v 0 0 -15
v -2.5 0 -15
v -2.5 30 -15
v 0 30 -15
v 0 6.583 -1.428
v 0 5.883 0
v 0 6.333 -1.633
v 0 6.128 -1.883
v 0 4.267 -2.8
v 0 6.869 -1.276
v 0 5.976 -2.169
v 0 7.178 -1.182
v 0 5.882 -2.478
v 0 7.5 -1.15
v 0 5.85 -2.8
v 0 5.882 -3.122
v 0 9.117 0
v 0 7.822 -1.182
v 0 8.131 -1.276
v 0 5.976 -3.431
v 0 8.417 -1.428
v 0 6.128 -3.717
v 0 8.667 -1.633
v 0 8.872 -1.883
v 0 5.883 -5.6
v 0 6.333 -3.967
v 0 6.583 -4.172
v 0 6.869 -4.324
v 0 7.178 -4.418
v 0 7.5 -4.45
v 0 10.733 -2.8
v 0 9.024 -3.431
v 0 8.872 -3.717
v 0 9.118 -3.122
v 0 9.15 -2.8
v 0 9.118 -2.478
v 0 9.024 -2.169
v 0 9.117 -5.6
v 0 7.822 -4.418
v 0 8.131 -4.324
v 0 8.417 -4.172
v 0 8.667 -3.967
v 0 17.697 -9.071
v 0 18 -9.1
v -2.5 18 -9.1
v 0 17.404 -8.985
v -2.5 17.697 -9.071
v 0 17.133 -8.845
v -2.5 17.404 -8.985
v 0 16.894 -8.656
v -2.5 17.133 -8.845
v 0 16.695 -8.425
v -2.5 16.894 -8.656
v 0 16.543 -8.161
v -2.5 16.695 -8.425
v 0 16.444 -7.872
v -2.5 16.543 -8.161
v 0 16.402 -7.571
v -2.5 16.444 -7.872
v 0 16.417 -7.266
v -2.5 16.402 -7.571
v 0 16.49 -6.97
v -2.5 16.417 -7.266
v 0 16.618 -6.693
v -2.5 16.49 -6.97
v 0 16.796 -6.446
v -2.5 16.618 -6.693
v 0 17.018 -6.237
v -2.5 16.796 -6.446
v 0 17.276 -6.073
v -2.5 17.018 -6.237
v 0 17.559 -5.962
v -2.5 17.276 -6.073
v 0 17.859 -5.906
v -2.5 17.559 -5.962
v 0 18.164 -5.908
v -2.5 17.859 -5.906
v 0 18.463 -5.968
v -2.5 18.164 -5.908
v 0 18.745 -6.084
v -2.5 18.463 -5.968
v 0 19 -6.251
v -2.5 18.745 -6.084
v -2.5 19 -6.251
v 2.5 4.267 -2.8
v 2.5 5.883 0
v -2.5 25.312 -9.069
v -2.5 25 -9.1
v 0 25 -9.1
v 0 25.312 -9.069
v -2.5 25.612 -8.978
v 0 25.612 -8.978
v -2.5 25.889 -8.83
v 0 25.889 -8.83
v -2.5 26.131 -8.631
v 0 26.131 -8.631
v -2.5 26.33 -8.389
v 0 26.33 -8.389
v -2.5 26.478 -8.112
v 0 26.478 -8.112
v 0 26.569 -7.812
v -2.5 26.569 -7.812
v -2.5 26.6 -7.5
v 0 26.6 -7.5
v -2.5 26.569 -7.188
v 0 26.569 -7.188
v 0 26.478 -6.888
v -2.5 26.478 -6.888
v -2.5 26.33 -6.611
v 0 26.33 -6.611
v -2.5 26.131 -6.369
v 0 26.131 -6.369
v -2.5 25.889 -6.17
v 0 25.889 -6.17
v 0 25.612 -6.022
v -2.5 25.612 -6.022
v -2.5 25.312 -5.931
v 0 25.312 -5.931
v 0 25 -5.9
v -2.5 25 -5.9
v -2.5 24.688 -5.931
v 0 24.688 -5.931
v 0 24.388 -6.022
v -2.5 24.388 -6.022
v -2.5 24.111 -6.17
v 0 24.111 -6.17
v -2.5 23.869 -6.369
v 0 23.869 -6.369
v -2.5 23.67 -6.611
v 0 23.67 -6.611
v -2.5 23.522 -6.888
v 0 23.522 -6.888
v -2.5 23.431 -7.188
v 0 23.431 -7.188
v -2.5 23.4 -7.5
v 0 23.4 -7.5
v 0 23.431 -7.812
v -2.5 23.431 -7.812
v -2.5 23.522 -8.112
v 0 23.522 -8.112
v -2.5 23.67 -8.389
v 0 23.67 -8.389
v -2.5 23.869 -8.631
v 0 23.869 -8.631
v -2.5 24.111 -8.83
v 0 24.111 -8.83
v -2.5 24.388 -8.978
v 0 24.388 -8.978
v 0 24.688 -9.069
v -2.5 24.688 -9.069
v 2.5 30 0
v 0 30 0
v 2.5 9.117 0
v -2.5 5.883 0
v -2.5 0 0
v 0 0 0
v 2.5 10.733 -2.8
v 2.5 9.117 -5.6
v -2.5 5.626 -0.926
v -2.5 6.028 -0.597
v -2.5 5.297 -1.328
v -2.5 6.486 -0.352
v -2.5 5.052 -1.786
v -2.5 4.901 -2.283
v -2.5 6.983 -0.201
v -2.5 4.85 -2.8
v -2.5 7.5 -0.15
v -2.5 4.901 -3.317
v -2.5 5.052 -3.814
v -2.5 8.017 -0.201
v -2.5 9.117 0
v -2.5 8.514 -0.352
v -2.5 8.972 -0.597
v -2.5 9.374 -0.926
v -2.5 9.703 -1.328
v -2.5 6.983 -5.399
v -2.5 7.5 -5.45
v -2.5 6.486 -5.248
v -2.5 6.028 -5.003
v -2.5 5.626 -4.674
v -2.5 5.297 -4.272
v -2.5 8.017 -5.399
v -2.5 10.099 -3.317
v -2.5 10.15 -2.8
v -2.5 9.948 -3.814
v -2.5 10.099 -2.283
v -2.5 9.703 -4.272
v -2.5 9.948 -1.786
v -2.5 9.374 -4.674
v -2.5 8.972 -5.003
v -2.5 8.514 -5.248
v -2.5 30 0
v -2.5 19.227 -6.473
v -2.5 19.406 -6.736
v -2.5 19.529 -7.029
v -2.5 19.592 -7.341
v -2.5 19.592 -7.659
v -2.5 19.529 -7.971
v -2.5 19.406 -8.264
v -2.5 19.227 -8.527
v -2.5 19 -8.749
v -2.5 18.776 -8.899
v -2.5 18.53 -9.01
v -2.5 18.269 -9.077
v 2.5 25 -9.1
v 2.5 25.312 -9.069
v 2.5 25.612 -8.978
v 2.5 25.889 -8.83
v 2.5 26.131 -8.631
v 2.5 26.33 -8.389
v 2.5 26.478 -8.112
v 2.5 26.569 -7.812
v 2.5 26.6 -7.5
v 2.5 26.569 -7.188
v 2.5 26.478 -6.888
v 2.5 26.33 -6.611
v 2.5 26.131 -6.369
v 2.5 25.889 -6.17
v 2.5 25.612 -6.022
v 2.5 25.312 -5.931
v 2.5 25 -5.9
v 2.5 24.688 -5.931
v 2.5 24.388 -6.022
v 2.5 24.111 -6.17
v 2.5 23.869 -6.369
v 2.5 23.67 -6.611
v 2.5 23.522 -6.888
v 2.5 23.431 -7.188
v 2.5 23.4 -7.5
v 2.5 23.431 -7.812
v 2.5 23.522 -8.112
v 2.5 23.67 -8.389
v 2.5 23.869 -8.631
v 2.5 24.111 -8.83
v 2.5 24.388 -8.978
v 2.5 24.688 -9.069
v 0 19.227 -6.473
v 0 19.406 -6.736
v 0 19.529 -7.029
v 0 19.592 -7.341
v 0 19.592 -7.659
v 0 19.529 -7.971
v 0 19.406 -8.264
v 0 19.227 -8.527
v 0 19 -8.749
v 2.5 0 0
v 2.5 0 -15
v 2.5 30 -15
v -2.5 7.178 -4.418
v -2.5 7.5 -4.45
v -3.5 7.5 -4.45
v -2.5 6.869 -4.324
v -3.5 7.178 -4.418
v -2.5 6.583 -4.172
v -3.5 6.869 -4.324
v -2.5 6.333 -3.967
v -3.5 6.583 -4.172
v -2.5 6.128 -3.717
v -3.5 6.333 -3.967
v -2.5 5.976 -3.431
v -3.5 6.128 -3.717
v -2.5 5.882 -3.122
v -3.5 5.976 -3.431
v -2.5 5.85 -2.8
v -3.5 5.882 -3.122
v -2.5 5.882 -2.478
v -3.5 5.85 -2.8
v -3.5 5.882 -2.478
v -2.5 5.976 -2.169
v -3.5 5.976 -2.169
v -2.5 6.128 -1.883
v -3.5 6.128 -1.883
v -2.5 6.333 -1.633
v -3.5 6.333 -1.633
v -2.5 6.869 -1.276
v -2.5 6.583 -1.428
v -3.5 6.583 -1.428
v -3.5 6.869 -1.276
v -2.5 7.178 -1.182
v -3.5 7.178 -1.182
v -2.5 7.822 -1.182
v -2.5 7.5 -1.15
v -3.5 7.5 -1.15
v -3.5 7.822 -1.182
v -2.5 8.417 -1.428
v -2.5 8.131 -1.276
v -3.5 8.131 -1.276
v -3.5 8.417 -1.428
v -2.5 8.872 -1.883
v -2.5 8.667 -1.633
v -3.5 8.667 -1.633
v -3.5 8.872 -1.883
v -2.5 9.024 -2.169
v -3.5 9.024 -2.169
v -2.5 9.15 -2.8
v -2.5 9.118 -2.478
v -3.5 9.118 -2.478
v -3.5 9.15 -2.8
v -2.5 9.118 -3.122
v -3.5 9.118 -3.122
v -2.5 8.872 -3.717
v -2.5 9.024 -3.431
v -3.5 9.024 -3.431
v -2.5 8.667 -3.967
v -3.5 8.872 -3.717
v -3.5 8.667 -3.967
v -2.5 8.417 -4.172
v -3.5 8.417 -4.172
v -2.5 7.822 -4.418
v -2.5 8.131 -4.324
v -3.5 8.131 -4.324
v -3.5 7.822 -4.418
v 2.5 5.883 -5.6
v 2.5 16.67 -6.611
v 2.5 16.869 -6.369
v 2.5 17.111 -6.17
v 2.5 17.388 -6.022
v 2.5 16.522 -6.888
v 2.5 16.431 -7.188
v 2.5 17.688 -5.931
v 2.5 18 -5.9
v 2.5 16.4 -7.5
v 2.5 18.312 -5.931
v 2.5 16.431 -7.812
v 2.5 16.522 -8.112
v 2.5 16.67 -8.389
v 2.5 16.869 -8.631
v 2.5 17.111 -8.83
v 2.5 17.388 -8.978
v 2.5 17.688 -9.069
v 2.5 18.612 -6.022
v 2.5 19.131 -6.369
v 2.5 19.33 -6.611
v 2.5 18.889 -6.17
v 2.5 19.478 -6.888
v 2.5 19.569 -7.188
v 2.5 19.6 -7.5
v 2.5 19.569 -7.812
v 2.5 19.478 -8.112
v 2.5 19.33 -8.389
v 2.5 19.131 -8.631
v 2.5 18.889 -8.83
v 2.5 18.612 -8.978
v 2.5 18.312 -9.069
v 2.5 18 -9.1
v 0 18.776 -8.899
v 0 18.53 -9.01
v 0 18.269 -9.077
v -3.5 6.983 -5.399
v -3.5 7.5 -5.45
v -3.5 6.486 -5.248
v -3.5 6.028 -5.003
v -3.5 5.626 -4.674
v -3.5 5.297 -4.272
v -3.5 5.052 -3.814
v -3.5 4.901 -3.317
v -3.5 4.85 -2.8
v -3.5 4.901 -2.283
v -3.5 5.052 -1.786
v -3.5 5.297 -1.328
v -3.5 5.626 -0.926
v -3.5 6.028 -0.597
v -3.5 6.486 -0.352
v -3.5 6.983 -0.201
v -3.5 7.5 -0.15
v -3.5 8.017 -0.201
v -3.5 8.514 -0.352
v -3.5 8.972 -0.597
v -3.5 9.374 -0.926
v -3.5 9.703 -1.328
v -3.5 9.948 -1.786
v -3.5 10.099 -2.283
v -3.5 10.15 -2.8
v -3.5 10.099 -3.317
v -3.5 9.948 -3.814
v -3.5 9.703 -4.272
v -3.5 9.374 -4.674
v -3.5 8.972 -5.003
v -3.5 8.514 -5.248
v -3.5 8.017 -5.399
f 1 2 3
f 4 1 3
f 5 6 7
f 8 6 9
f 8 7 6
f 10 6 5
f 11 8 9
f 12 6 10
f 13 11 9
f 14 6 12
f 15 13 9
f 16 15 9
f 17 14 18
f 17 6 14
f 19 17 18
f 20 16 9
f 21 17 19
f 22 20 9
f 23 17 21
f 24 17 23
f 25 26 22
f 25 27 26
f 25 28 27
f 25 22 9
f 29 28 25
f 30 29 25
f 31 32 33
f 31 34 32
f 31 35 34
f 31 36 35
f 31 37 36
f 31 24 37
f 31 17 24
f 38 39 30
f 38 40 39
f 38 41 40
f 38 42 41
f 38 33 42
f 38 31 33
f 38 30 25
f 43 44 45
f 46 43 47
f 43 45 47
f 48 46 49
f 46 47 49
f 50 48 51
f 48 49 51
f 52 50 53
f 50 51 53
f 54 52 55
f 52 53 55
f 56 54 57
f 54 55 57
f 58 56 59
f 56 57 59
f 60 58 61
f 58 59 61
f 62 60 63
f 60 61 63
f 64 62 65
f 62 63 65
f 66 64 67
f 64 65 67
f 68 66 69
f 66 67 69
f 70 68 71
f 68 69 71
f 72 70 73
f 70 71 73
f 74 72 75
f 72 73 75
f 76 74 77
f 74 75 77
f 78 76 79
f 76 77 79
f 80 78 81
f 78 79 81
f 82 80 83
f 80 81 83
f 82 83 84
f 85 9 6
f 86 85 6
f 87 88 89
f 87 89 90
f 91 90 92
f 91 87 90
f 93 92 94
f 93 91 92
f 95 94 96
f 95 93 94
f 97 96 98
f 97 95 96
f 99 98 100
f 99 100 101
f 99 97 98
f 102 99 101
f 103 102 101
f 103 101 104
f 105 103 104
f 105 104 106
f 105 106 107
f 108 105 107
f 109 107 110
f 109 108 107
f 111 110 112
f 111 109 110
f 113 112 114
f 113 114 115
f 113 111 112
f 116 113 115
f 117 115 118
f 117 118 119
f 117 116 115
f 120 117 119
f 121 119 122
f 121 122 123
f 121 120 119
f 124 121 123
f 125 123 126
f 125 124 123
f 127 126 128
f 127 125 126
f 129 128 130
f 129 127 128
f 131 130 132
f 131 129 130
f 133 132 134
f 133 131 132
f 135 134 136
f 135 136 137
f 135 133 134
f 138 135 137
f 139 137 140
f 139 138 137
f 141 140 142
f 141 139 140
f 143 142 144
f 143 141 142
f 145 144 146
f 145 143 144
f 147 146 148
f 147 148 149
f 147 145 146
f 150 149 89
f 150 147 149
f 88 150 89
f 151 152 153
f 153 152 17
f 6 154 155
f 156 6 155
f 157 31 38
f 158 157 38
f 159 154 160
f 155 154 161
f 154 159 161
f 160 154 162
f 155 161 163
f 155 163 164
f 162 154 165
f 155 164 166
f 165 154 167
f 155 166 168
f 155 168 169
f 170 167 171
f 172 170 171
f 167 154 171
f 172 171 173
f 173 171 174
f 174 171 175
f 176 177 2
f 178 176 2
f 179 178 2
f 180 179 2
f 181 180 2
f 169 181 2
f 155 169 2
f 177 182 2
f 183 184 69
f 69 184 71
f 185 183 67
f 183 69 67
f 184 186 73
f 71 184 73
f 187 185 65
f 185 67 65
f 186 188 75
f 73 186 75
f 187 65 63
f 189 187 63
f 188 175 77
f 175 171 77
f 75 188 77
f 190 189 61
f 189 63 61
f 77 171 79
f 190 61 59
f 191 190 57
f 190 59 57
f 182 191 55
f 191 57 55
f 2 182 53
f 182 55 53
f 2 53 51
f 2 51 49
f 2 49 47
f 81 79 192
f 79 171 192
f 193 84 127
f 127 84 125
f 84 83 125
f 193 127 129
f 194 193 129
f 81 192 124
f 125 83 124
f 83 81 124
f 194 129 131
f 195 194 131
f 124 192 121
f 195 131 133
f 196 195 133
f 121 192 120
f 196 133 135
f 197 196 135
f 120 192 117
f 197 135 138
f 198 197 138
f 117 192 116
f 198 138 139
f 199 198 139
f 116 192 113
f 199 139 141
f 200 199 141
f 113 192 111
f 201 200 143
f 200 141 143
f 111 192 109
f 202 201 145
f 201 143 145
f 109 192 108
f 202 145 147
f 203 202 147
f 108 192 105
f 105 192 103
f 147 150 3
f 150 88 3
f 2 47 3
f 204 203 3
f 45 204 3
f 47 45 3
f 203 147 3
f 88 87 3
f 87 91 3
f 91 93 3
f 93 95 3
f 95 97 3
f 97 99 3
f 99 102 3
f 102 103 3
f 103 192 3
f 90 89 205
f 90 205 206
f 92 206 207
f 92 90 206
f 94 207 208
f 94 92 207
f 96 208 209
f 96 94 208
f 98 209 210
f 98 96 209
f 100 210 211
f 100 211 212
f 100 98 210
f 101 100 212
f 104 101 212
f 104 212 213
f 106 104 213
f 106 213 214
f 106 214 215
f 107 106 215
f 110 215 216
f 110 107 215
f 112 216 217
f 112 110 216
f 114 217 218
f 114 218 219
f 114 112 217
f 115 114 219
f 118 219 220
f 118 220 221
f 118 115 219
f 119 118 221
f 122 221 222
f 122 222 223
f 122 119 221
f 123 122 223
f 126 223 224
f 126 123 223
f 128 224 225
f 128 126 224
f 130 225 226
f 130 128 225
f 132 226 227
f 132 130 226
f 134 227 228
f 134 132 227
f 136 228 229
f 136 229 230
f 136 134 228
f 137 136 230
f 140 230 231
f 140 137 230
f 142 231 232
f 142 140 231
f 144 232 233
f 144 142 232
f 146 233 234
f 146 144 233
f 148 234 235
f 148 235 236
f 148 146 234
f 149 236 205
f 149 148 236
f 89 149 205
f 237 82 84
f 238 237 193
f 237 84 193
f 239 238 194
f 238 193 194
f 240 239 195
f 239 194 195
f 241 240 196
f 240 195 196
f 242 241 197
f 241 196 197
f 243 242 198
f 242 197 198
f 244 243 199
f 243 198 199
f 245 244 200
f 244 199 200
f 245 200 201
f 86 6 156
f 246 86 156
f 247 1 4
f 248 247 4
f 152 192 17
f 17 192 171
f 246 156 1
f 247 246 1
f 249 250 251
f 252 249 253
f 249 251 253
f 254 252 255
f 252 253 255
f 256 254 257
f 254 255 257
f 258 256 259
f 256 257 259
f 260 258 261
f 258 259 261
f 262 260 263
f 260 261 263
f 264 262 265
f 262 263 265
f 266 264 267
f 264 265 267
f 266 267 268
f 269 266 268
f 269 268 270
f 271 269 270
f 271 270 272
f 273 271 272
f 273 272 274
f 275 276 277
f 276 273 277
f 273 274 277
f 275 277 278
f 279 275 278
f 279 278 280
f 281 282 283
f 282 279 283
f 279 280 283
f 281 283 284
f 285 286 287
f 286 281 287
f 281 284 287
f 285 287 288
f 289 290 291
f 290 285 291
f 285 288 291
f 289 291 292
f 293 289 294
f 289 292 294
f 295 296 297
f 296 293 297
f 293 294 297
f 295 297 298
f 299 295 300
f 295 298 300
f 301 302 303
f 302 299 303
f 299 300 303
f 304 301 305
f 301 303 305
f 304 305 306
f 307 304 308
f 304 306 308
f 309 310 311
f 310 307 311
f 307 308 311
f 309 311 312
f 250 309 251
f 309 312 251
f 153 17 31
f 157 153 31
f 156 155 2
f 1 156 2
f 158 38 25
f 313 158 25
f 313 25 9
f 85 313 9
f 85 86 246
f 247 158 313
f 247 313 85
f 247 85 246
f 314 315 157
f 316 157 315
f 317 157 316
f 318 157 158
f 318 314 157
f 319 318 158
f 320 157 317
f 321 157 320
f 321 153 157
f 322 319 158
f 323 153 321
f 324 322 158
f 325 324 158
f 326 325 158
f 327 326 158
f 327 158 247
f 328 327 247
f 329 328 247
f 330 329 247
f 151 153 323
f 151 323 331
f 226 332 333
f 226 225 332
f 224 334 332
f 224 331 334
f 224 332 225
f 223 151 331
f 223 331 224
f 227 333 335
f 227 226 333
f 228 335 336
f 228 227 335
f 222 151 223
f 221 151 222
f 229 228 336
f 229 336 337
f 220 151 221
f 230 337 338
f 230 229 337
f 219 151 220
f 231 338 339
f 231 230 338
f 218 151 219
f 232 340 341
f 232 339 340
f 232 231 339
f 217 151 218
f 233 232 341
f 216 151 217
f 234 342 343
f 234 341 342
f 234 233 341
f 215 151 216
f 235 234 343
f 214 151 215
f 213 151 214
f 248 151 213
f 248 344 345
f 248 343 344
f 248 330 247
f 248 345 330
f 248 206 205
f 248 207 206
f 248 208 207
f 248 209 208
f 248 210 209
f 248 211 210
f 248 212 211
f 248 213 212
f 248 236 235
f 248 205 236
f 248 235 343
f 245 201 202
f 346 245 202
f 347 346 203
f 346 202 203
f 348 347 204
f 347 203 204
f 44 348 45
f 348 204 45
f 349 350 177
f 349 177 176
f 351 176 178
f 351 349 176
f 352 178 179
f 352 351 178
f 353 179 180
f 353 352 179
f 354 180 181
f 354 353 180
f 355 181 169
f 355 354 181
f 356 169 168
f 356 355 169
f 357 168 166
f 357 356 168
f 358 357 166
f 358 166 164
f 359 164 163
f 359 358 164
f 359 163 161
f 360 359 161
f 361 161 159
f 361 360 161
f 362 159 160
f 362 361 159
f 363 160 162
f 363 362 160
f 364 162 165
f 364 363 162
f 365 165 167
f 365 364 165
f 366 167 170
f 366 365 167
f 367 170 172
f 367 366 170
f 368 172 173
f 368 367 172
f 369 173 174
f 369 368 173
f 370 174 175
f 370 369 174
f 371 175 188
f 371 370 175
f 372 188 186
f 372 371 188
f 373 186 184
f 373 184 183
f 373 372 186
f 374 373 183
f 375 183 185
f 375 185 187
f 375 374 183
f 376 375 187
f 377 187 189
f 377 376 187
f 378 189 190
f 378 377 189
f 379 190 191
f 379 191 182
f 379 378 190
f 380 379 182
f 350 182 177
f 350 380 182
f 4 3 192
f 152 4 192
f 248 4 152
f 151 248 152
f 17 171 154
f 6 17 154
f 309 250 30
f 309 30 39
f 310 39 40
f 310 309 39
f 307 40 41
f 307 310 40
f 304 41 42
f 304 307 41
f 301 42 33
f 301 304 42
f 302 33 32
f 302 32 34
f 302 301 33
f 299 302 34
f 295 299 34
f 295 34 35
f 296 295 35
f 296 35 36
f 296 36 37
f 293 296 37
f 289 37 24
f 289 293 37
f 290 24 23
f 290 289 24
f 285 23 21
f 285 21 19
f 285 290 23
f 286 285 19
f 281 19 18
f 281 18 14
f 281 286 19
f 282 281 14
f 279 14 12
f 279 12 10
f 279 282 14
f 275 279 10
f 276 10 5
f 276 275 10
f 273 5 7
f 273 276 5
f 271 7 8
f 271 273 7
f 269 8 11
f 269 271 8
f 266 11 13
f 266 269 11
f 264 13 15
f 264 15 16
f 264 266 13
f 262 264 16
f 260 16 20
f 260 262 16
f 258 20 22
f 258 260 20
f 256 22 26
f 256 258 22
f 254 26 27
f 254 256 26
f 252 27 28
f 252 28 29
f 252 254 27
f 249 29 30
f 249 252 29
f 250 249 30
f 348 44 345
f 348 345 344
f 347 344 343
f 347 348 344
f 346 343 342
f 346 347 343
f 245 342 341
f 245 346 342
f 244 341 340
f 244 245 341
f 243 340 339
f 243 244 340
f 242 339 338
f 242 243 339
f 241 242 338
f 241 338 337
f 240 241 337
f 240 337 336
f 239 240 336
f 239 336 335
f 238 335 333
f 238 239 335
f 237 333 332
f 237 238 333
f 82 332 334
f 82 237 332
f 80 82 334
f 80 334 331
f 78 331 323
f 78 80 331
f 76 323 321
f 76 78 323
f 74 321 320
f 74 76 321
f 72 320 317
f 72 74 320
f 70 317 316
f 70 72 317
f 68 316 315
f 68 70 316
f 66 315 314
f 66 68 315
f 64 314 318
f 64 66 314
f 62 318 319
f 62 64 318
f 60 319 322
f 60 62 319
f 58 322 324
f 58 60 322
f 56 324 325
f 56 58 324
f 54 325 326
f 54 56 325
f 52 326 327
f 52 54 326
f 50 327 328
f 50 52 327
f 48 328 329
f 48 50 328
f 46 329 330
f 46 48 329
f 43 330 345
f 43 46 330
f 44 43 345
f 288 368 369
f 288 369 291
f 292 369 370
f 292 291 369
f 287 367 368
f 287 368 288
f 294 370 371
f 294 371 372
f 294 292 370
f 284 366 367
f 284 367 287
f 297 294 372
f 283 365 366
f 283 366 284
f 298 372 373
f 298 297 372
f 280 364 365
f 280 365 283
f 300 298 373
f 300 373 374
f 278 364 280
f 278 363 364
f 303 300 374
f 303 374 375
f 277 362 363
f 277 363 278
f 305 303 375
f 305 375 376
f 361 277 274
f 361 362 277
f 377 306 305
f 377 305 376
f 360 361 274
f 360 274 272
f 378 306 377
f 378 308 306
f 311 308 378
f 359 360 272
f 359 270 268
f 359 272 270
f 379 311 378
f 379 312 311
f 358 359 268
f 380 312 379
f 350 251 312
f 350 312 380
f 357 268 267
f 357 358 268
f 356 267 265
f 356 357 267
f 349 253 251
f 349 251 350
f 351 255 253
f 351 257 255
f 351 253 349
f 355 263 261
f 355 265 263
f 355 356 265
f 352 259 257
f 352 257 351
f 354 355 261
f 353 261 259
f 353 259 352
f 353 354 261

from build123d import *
from build123d.topology import SkipClean

# Parameters (mm, degrees)
SKETCH1_R           = 1.6
BOSS_EXTRUDE1_DEPTH = 2.5
BOSS_EXTRUDE2_START = -2.5
SKETCH1_3_R         = 1.6
SKETCH1_3_R_2       = 1.65
BOSS_EXTRUDE2_DEPTH = 2.5
BOSS_EXTRUDE3_START = 1
SKETCH4_R           = 2.65
SKETCH4_R_2         = 1.65
BOSS_EXTRUDE3_DEPTH = 1


with BuildPart() as part:
    # Sketch1 → Boss-Extrude1 (new body)
    with BuildSketch(Plane(origin=(0, 0, 0), x_dir=(0, 0, -1), z_dir=(1, 0, 0))):
        Polygon((0, 5.883419246), (0, 0), (15, 0), (15, 30), (0, 30), (0, 9.116580754), (2.8, 10.733161507), (5.6, 9.116580754), (5.6, 5.883419246), (2.8, 4.266838493), align=None)
        with Locations((7.5, 18)):
            Circle(SKETCH1_R, mode=Mode.SUBTRACT)
        with Locations((7.5, 25)):
            Circle(SKETCH1_R, mode=Mode.SUBTRACT)
    extrude(amount=BOSS_EXTRUDE1_DEPTH)

    # Sketch1<3> → Boss-Extrude2 (add)
    # profile 1 of 7: a face of its own
    with SkipClean():  # the faces are left unmerged after this step: merging them gives an invalid solid
        with BuildSketch(Plane(origin=(0, 0, 0), x_dir=(0, 0, -1), z_dir=(1, 0, 0)).offset(BOSS_EXTRUDE2_START)):
            Polygon((0, 5.883419246), (0, 0), (15, 0), (15, 30), (0, 30), (0, 9.116580754), (2.8, 10.733161507), (5.6, 9.116580754), (5.6, 5.883419246), (2.8, 4.266838493), align=None)
            with Locations((7.5, 7.5)):
                Circle(SKETCH1_3_R, mode=Mode.SUBTRACT)
            with BuildLine():
                ThreePointArc((6.2510004, 19), (6.970094046, 21.509701851), (9.1, 20))
                ThreePointArc((9.1, 20), (9.009701851, 19.470094046), (8.7489996, 19))
                ThreePointArc((8.7489996, 19), (9.009701851, 18.529905954), (9.1, 18))
                ThreePointArc((9.1, 18), (6.970094046, 16.490298149), (6.2510004, 19))
            make_face(mode=Mode.SUBTRACT)
            with Locations((7.5, 25)):
                Circle(SKETCH1_3_R, mode=Mode.SUBTRACT)
        # profile 2 of 7: a face of its own
        with BuildSketch(Plane(origin=(0, 0, 0), x_dir=(0, 0, -1), z_dir=(1, 0, 0)).offset(BOSS_EXTRUDE2_START)):
            Polygon((0, 5.883419246), (0, 0), (15, 0), (15, 30), (0, 30), (0, 9.116580754), (2.8, 10.733161507), (5.6, 9.116580754), (5.6, 5.883419246), (2.8, 4.266838493), align=None)
            with Locations((7.5, 7.5)):
                Circle(SKETCH1_3_R, mode=Mode.SUBTRACT)
            with BuildLine():
                ThreePointArc((6.2510004, 19), (6.970094046, 21.509701851), (9.1, 20))
                ThreePointArc((9.1, 20), (9.009701851, 19.470094046), (8.7489996, 19))
                ThreePointArc((8.7489996, 19), (9.009701851, 18.529905954), (9.1, 18))
                ThreePointArc((9.1, 18), (6.970094046, 16.490298149), (6.2510004, 19))
            make_face(mode=Mode.SUBTRACT)
            with Locations((7.5, 25)):
                Circle(SKETCH1_3_R, mode=Mode.SUBTRACT)
        # profile 3 of 7: a face of its own
        with BuildSketch(Plane(origin=(0, 0, 0), x_dir=(0, 0, -1), z_dir=(1, 0, 0)).offset(BOSS_EXTRUDE2_START)):
            Polygon((0, 9.116580754), (0, 5.883419246), (2.8, 4.266838493), (5.6, 5.883419246), (5.6, 9.116580754), (2.8, 10.733161507), align=None)
            with Locations((2.8, 7.5)):
                Circle(SKETCH1_3_R_2, mode=Mode.SUBTRACT)
        # profile 4 of 7: a face of its own
        with BuildSketch(Plane(origin=(0, 0, 0), x_dir=(0, 0, -1), z_dir=(1, 0, 0)).offset(BOSS_EXTRUDE2_START)):
            with Locations((7.5, 7.5)):
                Circle(SKETCH1_3_R)
        # profile 5 of 7: a face of its own
        with BuildSketch(Plane(origin=(0, 0, 0), x_dir=(0, 0, -1), z_dir=(1, 0, 0)).offset(BOSS_EXTRUDE2_START)):
            with Locations((7.5, 7.5)):
                Circle(SKETCH1_3_R)
        # profile 6 of 7: a face of its own
        with BuildSketch(Plane(origin=(0, 0, 0), x_dir=(0, 0, -1), z_dir=(1, 0, 0)).offset(BOSS_EXTRUDE2_START)):
            with BuildLine():
                ThreePointArc((8.7489996, 19), (9.009701851, 19.470094046), (9.1, 20))
                ThreePointArc((9.1, 20), (6.970094046, 21.509701851), (6.2510004, 19))
                ThreePointArc((6.2510004, 19), (7.5, 19.6), (8.7489996, 19))
            make_face()
        # profile 7 of 7: a face of its own
        with BuildSketch(Plane(origin=(0, 0, 0), x_dir=(0, 0, -1), z_dir=(1, 0, 0)).offset(BOSS_EXTRUDE2_START)):
            with BuildLine():
                ThreePointArc((8.7489996, 19), (9.009701851, 19.470094046), (9.1, 20))
                ThreePointArc((9.1, 20), (6.970094046, 21.509701851), (6.2510004, 19))
                ThreePointArc((6.2510004, 19), (7.5, 19.6), (8.7489996, 19))
            make_face()
        extrude(amount=BOSS_EXTRUDE2_DEPTH)

    # Sketch4 → Boss-Extrude3 (add)
    with BuildSketch(Plane.ZY.offset(2.5).offset(BOSS_EXTRUDE3_START)):
        with Locations(Location((-2.8, 7.5, 0), (0, 0, 180))):
            Circle(SKETCH4_R)
        with Locations(Location((-2.8, 7.5, 0), (0, 0, 180))):
            Circle(SKETCH4_R_2, mode=Mode.SUBTRACT)
    extrude(amount=-BOSS_EXTRUDE3_DEPTH)


solid = part.part
